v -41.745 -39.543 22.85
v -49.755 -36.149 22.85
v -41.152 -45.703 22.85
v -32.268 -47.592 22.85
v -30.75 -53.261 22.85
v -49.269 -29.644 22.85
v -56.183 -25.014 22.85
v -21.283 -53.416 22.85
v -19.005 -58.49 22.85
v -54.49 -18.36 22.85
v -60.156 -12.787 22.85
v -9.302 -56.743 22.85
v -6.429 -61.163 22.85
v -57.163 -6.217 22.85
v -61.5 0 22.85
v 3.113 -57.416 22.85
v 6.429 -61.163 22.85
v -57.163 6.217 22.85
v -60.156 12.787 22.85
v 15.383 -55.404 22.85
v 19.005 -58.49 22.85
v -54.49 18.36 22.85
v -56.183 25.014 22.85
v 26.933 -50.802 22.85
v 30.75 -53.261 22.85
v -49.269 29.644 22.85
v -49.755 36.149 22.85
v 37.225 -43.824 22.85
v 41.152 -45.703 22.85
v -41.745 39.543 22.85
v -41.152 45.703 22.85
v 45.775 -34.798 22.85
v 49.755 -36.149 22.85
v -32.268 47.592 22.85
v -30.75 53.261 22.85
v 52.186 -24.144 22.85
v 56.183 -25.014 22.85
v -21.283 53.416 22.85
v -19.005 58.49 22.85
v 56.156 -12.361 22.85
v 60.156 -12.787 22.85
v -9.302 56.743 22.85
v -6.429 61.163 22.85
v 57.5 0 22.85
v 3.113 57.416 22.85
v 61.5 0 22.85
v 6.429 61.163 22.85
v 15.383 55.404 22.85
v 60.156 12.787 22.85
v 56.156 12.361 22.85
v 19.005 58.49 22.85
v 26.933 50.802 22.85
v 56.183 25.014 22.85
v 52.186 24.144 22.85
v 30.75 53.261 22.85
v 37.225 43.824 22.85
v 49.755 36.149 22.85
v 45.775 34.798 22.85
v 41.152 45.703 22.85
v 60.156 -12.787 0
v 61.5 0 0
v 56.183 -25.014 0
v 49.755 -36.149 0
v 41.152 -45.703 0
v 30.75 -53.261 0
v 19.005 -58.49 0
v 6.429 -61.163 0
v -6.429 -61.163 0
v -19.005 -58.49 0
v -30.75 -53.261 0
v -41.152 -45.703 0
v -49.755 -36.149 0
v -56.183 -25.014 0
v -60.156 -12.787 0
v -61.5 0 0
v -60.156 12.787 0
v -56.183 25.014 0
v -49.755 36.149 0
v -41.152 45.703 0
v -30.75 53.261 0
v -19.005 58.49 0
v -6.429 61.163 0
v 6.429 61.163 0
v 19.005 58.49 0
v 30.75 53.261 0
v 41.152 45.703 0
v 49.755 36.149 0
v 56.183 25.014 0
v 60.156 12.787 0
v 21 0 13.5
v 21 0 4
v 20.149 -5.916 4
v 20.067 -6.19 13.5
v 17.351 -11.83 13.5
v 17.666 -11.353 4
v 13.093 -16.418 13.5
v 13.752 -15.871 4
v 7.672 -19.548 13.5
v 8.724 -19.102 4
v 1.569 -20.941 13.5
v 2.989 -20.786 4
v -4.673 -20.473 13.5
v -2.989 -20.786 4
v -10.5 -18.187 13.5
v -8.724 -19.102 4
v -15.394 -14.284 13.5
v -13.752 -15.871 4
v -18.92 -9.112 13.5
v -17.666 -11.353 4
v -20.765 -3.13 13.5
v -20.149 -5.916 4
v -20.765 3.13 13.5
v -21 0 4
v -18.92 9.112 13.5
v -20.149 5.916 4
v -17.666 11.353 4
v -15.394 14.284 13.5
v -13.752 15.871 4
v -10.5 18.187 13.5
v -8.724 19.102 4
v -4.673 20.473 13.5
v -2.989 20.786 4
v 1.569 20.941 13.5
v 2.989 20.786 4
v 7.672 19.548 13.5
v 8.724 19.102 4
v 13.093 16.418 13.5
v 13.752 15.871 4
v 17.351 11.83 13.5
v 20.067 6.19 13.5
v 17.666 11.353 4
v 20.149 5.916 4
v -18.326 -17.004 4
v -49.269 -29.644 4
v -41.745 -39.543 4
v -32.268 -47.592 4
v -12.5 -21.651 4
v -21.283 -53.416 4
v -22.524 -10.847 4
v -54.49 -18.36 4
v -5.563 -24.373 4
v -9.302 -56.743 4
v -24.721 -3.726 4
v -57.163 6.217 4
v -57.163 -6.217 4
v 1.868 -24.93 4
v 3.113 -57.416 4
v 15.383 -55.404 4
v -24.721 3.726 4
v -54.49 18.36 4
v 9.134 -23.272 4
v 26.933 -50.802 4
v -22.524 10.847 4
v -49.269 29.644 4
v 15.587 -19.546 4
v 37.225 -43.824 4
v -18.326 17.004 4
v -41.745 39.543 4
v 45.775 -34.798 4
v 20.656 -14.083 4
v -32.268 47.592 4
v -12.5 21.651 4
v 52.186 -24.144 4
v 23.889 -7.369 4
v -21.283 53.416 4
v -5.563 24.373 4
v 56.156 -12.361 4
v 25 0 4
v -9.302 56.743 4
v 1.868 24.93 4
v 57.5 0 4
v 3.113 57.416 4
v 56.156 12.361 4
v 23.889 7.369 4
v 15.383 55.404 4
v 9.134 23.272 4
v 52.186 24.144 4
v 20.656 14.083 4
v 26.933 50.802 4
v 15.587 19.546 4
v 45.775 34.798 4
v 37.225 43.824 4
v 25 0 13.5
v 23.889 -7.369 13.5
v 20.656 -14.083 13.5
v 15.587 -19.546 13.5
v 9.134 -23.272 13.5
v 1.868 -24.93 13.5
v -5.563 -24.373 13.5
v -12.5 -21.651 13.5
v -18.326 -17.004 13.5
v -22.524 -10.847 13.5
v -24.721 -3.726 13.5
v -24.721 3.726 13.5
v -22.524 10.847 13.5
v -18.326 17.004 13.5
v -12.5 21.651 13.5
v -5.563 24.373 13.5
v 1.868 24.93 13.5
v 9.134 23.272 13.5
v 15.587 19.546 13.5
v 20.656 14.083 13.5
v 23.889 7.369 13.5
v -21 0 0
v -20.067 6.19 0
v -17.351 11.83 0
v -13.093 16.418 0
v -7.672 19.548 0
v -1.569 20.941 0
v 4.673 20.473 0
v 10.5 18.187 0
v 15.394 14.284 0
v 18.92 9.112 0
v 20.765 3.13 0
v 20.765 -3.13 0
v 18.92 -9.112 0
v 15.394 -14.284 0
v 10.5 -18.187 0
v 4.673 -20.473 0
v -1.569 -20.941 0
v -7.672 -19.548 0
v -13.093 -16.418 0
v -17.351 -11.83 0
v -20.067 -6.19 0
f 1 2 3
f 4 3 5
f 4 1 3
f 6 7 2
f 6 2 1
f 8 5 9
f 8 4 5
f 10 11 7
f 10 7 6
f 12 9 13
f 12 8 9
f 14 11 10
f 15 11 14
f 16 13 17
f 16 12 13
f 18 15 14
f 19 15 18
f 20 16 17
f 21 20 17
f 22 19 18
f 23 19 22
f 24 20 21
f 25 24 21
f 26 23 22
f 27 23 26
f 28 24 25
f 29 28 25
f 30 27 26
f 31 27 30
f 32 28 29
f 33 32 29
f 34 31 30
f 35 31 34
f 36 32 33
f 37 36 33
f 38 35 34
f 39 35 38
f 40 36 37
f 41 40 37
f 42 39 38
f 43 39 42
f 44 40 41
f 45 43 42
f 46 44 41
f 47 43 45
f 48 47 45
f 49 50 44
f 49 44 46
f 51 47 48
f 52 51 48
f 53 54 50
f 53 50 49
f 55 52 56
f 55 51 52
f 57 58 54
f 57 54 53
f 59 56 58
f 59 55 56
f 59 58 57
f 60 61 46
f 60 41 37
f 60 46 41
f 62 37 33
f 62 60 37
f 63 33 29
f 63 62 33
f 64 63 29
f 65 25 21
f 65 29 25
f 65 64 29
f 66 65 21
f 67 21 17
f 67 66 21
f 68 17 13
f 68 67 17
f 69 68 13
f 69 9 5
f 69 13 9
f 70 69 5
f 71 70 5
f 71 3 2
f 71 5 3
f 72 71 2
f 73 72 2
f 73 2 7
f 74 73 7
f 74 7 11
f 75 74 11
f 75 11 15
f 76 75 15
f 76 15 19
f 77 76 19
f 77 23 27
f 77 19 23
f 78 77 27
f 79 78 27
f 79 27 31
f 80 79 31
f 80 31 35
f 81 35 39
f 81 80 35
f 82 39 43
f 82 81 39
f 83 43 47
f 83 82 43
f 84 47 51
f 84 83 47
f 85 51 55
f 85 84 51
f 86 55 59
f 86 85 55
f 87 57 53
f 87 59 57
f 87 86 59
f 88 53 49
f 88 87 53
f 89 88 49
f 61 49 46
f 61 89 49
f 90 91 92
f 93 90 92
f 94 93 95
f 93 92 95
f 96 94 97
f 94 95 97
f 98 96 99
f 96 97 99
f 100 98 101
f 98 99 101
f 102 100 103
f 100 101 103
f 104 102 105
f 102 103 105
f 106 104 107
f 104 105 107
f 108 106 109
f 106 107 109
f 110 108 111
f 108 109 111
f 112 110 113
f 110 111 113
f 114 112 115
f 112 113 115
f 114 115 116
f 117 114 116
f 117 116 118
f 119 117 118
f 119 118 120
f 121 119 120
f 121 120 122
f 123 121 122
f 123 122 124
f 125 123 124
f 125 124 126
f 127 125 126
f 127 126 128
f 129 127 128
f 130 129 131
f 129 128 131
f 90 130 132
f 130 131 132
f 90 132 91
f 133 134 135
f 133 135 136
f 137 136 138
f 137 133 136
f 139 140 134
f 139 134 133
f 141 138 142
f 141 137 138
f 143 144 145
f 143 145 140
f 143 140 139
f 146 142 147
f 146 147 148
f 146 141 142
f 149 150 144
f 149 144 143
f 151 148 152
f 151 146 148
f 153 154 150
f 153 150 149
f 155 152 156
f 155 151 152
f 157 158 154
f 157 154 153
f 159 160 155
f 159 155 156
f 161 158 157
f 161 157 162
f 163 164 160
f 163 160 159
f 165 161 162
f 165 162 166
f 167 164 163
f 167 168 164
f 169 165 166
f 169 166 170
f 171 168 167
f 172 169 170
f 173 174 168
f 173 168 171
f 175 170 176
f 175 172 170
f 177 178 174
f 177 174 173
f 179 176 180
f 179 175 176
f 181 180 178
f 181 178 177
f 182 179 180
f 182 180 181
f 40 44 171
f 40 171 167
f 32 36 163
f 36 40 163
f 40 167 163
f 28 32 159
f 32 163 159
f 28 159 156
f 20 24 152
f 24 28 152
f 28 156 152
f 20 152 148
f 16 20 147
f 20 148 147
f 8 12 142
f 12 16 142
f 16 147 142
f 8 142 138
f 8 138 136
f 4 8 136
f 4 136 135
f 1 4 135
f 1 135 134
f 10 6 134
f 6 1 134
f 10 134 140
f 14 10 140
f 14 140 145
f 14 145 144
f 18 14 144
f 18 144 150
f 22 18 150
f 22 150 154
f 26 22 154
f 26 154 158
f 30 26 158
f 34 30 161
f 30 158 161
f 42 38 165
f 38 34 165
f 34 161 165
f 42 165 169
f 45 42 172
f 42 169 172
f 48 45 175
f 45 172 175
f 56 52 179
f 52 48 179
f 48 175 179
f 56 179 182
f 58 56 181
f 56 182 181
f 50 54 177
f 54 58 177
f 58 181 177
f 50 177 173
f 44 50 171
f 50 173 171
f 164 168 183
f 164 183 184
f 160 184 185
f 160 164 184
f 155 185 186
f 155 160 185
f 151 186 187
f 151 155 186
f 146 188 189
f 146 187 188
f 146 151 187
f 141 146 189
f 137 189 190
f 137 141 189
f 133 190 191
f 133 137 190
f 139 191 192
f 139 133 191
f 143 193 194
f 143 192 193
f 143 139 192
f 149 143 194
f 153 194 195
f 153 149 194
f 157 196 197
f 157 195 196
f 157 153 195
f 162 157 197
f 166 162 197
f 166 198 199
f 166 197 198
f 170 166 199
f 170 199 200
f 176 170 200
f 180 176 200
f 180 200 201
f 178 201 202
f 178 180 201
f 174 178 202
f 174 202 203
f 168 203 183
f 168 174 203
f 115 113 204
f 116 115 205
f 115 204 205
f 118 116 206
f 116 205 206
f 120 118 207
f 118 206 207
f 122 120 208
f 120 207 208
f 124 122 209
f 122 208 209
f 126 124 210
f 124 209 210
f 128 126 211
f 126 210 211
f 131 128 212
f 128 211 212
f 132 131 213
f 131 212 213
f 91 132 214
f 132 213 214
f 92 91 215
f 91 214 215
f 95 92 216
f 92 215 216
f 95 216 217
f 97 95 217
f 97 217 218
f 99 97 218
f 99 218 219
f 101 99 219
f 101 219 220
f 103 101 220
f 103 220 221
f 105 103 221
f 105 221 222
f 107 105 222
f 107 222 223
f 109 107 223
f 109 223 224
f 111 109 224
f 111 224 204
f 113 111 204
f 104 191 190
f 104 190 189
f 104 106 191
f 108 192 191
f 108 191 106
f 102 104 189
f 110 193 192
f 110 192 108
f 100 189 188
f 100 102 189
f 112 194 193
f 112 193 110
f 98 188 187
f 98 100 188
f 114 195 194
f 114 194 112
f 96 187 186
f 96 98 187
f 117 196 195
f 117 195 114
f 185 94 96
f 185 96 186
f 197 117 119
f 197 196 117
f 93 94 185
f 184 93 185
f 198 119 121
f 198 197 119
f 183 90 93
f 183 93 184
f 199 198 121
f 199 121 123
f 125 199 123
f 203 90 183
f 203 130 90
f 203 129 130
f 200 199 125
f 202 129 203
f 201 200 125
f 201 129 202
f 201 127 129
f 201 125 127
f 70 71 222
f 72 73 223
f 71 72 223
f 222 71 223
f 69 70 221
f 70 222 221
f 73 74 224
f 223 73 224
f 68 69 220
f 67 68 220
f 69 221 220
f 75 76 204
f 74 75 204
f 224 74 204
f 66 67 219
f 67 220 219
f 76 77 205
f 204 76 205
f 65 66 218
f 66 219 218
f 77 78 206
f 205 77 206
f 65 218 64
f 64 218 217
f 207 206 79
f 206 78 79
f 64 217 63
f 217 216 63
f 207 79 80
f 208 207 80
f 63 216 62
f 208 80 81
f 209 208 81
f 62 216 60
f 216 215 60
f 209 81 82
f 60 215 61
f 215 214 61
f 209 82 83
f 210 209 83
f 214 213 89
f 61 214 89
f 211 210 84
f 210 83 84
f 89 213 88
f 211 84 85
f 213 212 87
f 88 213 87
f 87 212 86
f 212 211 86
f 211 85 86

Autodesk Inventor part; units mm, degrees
ref_plane "YZ Plane" through (0, 0, 0) normal (1, 0, 0) x (0, 1, 0)
ref_plane "XZ Plane" through (0, 0, 0) normal (0, 1, 0) x (-1, 0, 0)
ref_plane "XY Plane" through (0, 0, 0) normal (0, 0, 1) x (1, 0, 0)
sketch "Sketch1" plane through (0, 0, 0) normal (0, 0, 1) x (1, 0, 0)
  circle A0 centre (0, 0) radius 61.5
  dimension "d0" = 123
extrude "Extrusion1" add sketch "Sketch1" along normal blind 4
sketch "Sketch2" plane through (0, 0, 4) normal (0, 0, 1) x (1, 0, 0)
  circle A0 centre (0, 0) radius 61.5 projected
  circle A1 centre (0, 0) radius 57.5
  dimension "d12" = 115
extrude "Extrusion2" add sketch "Sketch2" along normal blind 18.85
sketch "Sketch3" plane through (0, 0, 0) normal (0, 0, -1) x (-1, 0, 0)
  circle A0 centre (0, 0) radius 21
  dimension "d6" = 42
extrude "Extrusion3" cut sketch "Sketch3" against normal through all
sketch "Sketch4" plane through (0, 0, 4) normal (0, 0, 1) x (1, 0, 0)
  circle A0 centre (0, 0) radius 21 projected
  circle A1 centre (0, 0) radius 25
  dimension "d9" = 4
extrude "Extrusion4" add sketch "Sketch4" along normal blind 9.5
properties part number "stator_housing"
